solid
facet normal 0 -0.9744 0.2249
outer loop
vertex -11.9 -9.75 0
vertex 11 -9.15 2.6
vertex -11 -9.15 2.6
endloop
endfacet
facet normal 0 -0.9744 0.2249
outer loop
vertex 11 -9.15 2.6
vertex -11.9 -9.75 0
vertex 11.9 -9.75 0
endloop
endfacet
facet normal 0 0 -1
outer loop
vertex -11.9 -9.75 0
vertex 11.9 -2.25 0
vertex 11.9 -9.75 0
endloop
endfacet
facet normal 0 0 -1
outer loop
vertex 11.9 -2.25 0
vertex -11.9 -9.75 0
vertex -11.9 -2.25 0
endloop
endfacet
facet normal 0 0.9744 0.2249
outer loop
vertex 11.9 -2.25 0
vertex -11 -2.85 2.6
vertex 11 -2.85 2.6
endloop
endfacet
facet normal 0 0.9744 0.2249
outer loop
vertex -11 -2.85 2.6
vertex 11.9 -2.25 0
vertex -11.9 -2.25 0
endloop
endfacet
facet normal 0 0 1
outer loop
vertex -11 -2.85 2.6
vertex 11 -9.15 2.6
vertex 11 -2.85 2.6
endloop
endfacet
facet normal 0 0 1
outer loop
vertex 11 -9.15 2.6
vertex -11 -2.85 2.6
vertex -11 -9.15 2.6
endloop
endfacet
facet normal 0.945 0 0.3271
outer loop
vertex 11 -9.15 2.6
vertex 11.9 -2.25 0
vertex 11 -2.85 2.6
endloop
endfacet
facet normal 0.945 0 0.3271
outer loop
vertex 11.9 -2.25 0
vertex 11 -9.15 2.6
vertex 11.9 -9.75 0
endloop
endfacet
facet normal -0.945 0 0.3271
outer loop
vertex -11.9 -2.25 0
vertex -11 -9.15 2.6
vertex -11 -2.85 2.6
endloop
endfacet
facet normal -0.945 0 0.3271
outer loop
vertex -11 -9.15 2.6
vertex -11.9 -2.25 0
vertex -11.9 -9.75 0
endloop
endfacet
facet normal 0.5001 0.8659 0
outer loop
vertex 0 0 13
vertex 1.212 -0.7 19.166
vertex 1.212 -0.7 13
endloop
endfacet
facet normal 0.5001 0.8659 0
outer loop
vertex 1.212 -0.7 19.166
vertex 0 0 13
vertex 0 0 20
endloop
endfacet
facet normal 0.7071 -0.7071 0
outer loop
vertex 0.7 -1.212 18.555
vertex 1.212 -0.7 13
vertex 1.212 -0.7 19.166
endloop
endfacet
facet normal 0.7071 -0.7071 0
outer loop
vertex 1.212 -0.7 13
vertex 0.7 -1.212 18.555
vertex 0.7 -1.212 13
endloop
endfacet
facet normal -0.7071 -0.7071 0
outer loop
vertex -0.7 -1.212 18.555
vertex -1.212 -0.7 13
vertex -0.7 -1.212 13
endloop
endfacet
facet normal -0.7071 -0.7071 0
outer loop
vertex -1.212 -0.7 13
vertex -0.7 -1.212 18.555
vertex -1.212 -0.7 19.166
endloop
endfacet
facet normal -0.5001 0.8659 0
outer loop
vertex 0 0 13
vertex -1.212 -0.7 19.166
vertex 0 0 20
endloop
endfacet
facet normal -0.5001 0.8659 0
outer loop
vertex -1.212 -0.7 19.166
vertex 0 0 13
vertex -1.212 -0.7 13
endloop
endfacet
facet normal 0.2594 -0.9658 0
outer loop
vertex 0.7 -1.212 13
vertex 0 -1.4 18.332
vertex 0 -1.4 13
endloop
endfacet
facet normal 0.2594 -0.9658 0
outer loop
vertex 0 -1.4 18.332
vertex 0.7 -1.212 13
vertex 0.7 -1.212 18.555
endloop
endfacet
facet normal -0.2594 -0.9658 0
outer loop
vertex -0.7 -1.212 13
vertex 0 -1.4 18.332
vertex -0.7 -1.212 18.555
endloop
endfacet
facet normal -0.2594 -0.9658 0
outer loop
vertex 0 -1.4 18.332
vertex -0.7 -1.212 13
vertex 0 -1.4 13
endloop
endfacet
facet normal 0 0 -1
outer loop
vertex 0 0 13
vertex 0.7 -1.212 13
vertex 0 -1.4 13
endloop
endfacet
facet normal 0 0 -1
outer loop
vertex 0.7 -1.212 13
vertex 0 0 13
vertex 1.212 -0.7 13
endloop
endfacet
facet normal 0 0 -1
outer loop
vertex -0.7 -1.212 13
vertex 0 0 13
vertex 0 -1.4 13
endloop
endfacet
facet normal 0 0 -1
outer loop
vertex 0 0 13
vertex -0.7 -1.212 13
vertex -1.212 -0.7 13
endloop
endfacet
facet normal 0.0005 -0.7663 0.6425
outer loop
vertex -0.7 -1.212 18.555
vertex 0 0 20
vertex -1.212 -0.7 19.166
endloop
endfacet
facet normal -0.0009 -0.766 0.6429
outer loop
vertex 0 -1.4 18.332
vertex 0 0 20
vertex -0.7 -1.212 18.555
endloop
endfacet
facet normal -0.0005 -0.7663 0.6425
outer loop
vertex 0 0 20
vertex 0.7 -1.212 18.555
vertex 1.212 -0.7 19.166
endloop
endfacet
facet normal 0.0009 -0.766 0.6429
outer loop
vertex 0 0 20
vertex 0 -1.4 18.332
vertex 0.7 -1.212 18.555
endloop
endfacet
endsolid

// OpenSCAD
////use $fn=1000 for manufacturing. 
// rendering with 1K facet number is taking 8 minutes
$fn=12; 

ld=20;  // base of main housing: 15.5 mm radius => 31mm length end to end
sd=ld/2;  // top of main housing:.7.5mm radius => 1 mm length end to end
h0=15;        // hight of main housing
ht=12;        // hight of tip from top of main housing
r1t=2.7;      // bottom radius of the tip
r2t=2;      // top radious of the tip
rTipHole=r2t*0.7; // radious of tip hole
speakerSpaceDividerWidth= 2 * rTipHole*1.1;
yScale=0.8;

    // speaker housing
// make sure this fuses with tip of speaker without sharp edges.
speakerR=(13)/2; // 15mm speaker + space
speakerFillerH=h0*0.4956; // connection point of speaker to tip's hollow channels
speakerCenterX=8;
speakerCenterY=5;
micCenterX=0;
micCenterY=-6;

//draw2();
//translate([0,-38,0]) backPlate();
//drawWithCut(0,-1);
//drawInner3();
micHousing();
//translate([0,-28,8]) PCB();

module torus(r1=10.2,r2=2.2)
{
  rotate_extrude()
    translate([(r1-r2)/2, 0, 0])
        circle(r = r2/2);
}

module drawInner3()
{
    z1=40;//4.35;
    scale([1,yScale,1]) 
      cylinder(h=h0/z1, r1=ld, r2=sd-(1-1/z1)*(sd-ld)); 
    drawSpeakersAndMic();
    //tipHole();
    tipInner();
    tipWall(0);
    tipWall(1);
    tipWall(2);
    snipPins();
    jack();
}

module drawSpeakersAndMic()
{
    drawRoundSpeaker(1);
    drawRoundSpeaker(-1);
    micHousing();
    snipPins();
    jack();
}

module drawRoundSpeaker(n=1)
{
    translate([n*speakerCenterX,speakerCenterY,0])
    {
        cylinder(h=7.5,r1=speakerR,r2=speakerR);

        rotate([0,0,n*105])
        translate([n*(speakerR-1),0,0])
        rotate([0,n*90,0])
        cylinder(h=6,r1=6/2,r2=3.5/2);
    }
    
    // Speaker to TipChannel
    union()
    {
        translate([8*n, 4, speakerFillerH-2])
        rotate([0, -n*31.8, 27*n])
          scale([1,1.35,1])
            cylinder(15, r1 = 4, r2 = 0.45);
    }    
}

module drawWithCut(x=0,y=0)
{
    difference()
    {
        draw2();
        translate([-50+x, -50+y,0])
        //translate([0,0.75,0])
          cube([100, 50, 50]);
    }
}

module draw2()
{
  difference() 
  {
    drawMain_Tubes_MicTubeAllTheWay_SpeakerTubeHalfWay();
    drawSpeakersAndMic();
  }
}


module drawMain_Tubes_MicTubeAllTheWay_SpeakerTubeHalfWay()
{
union()
{
difference()
    {
  mainBlock();
  tipHole();
    }
tipInner();
tipWall(0);
tipWall(1);
tipWall(2);
}
}


module mainBlock()
{
    scale([1,yScale,1]) 
  difference()
    {
  union()
  {
    cylinder(h=h0, r1=ld+10, r2=sd); 

    translate([0,0,h0])
    cylinder(h=ht/4, r1=sd, r2=r2t); 
    
    translate([0,0,h0])
      cylinder(h=ht, r1=r1t, r2=r2t); 
    
    translate([0,0,h0+ht/2])
      cylinder(h=ht/2, r1=r1t*1.1, r2=r2t);
  }
  circularWallWithGap(height=16,innerRadius=ld-2,width=15,gapAngle=0);
}
};

module micHousing()
{
    w=7.5;
    dw=1.2/2;
    l=23.8;
    dl=1.8/2;
    h=2.6;
    translate([micCenterX,micCenterY,0])
    translate([l/2,-w/2,0])
    rotate([0,-90,0])
    difference()
    {
    linear_extrude(l)
    polygon(
        [
        [0,0],
        [0,w],
        [h,w-dw],
        [h,dw]
        ]);
    // Trim the 'l' dimension
    translate([0,l/2,0])
    rotate([90,0,0])
    linear_extrude(l)
    polygon(
        [
        [0,0],
        [h,dl],
        [h,0]
        ]);
    translate([0,l/2,l])
    rotate([90,0,0])
    linear_extrude(l)
    polygon(
        [
        [0,0],
        [h,-dl],
        [h,0]
        ]);

    }
    
    // Connect speaker space to above
    /*
    translate([0,-6,2.3])
      rotate([-0,0,0])
        scale([1,0.35,1])
        cylinder(4,9,3);
    
    // 3rd cylinder to connect to the below gap.
    
    translate([0,-6,4])
      rotate([-35,0,0])
        scale([1,0.6,1])
        cylinder(5,3,1.5);
    */
    // this is building  120 degree arc with 3 points. we can add more points.
    translate([0,0,13]) p6(7,rTipHole);
    //translate([0,0,10]) p6(6,rTipHole*2);
    //translate([0,0,7]) p6(6,rTipHole*3);

    //tipInner();
    
 };

module p6(h=5,r=1)
 {
   difference()
     {
   linear_extrude(h)
   polygon(
    [[0,0],
    [1*r*sin(120),1*r*cos(120)],
    [1*r*sin(150),1*r*cos(150)],
    [1*r*sin(180),1*r*cos(180)],
    [1*r*sin(210),1*r*cos(210)],
    [1*r*sin(240),1*r*cos(240)]]);
   translate([5,0,h])
     rotate([-50,0,180])
     cube(10);
     }
}
 
// the wall width at the top of the tip is 0.3*r2t=0.6 mm. is this too small? 
module tipHole()
{
  translate([0,0,speakerFillerH+9.8])
  cylinder(h=h0+ht+1.5,r1=rTipHole,r2=rTipHole);
};

// inner tip. smallest dimension. r=0.8 mm. 1.6mm radius.
module tipInner()
{
  cylinder(h=h0+ht+1.5,r1=r2t*0.4,r2=r2t*0.4);
};

// tip wall width is 0.6 mm. should be ok.
// tip wall length is 1.5*.9=1.35 mm.
module tipWall(n=0)
{
    ww=0.6;
    rotate(n*120)
    translate([-ww/2,0,0])
    cube([ww,r2t*0.9,h0+ht+1]);
}

module snipPins()
{
    sc=1.2;
    
    sx=13;
    sy=-2;

    snipPin(sx+1,sy-1);
    snipPin(-sx-1,sy-1);
}

module jack()
{
    // wire hole for 2 microphone wires
    translate([0,10.5,2.5])
    cube([2.5,20,5],center=true);
}

module snipPin(x=0,y=0)
{
    // M3 screw, 5mm
    translate([x,y,-2])
    cylinder(h=20,r1=1.1,r2=1.1);
    
    // one edge is 4mm.
    translate([x,y,9])
    linear_extrude(20)
    circle(2.31,$fn=6);
    
    // head space at the bottom
    translate([x,y,-2])
    cylinder(h=3,r1=1.5,r2=1.5);

    // draw spaces for nut and screw head
    // see: https://www.westfieldfasteners.co.uk/Standards/Nut_Hex_M.pdf
    //https://www.engineersedge.com/hardware/_metric_socket_head_cap_screws_14054.htm
}

module backPlate()
{
    zh=5; // outer wall hight
    z1=2; // base thickness
    sd2=ld-zh/h0*(ld-sd);
    difference()
    {
    scale([1,yScale,1])
    difference()
    {
      union()
      {
        cylinder(h=zh, r1=ld+1, r2=ld); 
        translate([0,0,zh])
          cylinder(h=zh, r1=ld, r2=ld-2); 
      }
      translate([0,0,z1])
        cylinder(h=zh+10, r1=ld-2+0.05, r2=ld-2+0.05); 
    }
    snipPins();
    translate([0,16,z1+3+6])
      cube([6.1,12,15],center=true);
    
    // speaker o-ring
    translate([speakerCenterX,speakerCenterY,z1])
    torus(10.2,2.2);
    translate([-speakerCenterX,speakerCenterY,z1])
    torus(10.2,2.2);
    }

    // mic is 2mm elevated
    difference()
    {
        translate([micCenterX+4.5,micCenterY,0])
        cylinder(h=z1+2,r1=5,r2=5);
        // mic oring
        translate([micCenterX+4.5,micCenterY,z1+2])
        torus(5,2);
    }
    showInners=0;
    
    if(showInners==1)
    {
    //small bumps for speakers. 1mm portruding.
    translate([speakerCenterX,speakerCenterY,z1])
    union()
    {
      circularWallWithGap(height=zh-z1+1,innerRadius=speakerR,width=1,gapAngle=90);
    }
    
    translate([-speakerCenterX,speakerCenterY,z1])
    union()
    {
      circularWallWithGap(height=zh-z1+1,innerRadius=speakerR,width=1,gapAngle=90);
    }
    
    // very small bump for mic:
    translate([micCenterX,micCenterY,z1])
    union()
    {
      circularWallWithGap(height=zh-z1,innerRadius=3.1,width=1,gapAngle=90);
    }
    }
}

module circularWallWithGap(height=2,innerRadius=11,width=1,
gapAngle=90)
{
    difference()
    {
        cylinder(h=height,r1=innerRadius+width,r2=innerRadius+width,center=false);
        cylinder(h=height,r1=innerRadius,r2=innerRadius,center=false);
        //translate([20,-innerRadius*1.5,0])
        //cube([3*innerRadius,3*innerRadius,height]);
    }
}

module PCB()
{
    // PCB outer dimensions.
    // This should fit in the base
    cube([22,18,1],center=true);
}
